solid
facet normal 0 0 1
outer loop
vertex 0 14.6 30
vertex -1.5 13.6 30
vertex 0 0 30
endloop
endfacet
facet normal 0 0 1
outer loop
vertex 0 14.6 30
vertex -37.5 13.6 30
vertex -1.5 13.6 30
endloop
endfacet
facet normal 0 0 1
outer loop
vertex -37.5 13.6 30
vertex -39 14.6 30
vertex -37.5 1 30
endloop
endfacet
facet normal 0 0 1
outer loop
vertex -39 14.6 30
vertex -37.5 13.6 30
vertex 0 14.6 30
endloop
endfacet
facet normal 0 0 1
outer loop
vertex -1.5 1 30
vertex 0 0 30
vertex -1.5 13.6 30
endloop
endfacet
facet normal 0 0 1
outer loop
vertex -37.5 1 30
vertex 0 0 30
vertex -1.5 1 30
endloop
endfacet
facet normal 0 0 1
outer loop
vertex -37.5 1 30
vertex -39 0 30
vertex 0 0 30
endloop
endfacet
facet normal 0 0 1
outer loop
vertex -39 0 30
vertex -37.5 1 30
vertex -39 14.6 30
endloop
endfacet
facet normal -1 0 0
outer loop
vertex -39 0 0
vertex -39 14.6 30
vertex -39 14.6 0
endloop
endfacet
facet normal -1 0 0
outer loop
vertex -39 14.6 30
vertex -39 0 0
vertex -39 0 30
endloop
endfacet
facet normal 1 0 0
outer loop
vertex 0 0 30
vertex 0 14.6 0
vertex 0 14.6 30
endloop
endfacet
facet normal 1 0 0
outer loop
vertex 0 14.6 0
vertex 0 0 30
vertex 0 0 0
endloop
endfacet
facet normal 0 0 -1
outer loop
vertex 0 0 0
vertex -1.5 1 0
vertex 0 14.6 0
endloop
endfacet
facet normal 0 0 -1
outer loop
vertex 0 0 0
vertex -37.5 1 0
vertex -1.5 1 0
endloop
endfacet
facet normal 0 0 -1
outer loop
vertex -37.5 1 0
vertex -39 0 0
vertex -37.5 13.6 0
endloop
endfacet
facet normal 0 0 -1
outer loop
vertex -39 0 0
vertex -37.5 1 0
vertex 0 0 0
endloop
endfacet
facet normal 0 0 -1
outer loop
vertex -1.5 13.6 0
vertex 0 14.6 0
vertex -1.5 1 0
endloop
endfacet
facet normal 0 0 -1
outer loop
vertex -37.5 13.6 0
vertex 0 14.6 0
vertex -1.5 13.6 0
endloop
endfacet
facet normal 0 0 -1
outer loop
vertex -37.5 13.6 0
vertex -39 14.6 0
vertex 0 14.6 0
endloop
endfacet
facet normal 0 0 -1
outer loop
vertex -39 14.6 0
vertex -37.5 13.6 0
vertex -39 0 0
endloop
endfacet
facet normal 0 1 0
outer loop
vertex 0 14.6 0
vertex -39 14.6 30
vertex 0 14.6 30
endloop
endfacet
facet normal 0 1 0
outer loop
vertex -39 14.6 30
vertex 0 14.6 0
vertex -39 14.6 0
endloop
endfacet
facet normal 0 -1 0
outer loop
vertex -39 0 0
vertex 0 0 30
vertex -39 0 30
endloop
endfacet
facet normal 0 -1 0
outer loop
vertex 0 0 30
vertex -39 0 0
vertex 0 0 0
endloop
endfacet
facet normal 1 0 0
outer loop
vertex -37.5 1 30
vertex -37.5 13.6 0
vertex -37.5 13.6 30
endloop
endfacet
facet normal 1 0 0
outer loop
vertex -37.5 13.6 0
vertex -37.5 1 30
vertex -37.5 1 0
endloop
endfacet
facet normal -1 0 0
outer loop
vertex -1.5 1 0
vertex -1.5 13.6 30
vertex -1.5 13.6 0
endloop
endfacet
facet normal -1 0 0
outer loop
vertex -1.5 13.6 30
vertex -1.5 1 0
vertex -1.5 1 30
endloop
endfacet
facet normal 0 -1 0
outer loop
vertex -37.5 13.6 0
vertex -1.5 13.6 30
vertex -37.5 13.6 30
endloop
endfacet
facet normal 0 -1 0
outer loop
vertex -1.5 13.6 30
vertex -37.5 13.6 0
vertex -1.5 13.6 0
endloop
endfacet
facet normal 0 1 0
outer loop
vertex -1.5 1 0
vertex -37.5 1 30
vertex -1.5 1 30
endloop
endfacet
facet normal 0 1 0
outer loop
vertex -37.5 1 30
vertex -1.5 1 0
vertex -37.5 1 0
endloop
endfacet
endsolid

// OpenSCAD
// file: belt_configuration.scad
belt_thickness = 5.3;
belt_height = 35;
buckle_thickness = 2;
buckle_length = 30;

$fn = 20;

cross_width = 25;
h_width = 25;
peak_width = 10;

link_height = 20;

pin_diameter = 2.05;

pin_tolerance = 0.2;

hole_diameter = 3;

mo = 0.01;


link_tolerance = 1;
link_depth = pin_diameter + 2*link_tolerance;
link_depth_height = 20;

tolerance = 1;
// main file
include<belt_configuration.scad>

module buckle()
{
	difference()
	{
		cube([buckle_length, 2*belt_thickness+2*buckle_thickness, belt_height+2*buckle_thickness]);
		translate([-mo, buckle_thickness-tolerance, buckle_thickness-tolerance/2])
		cube([buckle_length+2*mo, 2*belt_thickness+2*tolerance, belt_height+tolerance]);
	}
}

rotate([0,-90,0])
buckle();
